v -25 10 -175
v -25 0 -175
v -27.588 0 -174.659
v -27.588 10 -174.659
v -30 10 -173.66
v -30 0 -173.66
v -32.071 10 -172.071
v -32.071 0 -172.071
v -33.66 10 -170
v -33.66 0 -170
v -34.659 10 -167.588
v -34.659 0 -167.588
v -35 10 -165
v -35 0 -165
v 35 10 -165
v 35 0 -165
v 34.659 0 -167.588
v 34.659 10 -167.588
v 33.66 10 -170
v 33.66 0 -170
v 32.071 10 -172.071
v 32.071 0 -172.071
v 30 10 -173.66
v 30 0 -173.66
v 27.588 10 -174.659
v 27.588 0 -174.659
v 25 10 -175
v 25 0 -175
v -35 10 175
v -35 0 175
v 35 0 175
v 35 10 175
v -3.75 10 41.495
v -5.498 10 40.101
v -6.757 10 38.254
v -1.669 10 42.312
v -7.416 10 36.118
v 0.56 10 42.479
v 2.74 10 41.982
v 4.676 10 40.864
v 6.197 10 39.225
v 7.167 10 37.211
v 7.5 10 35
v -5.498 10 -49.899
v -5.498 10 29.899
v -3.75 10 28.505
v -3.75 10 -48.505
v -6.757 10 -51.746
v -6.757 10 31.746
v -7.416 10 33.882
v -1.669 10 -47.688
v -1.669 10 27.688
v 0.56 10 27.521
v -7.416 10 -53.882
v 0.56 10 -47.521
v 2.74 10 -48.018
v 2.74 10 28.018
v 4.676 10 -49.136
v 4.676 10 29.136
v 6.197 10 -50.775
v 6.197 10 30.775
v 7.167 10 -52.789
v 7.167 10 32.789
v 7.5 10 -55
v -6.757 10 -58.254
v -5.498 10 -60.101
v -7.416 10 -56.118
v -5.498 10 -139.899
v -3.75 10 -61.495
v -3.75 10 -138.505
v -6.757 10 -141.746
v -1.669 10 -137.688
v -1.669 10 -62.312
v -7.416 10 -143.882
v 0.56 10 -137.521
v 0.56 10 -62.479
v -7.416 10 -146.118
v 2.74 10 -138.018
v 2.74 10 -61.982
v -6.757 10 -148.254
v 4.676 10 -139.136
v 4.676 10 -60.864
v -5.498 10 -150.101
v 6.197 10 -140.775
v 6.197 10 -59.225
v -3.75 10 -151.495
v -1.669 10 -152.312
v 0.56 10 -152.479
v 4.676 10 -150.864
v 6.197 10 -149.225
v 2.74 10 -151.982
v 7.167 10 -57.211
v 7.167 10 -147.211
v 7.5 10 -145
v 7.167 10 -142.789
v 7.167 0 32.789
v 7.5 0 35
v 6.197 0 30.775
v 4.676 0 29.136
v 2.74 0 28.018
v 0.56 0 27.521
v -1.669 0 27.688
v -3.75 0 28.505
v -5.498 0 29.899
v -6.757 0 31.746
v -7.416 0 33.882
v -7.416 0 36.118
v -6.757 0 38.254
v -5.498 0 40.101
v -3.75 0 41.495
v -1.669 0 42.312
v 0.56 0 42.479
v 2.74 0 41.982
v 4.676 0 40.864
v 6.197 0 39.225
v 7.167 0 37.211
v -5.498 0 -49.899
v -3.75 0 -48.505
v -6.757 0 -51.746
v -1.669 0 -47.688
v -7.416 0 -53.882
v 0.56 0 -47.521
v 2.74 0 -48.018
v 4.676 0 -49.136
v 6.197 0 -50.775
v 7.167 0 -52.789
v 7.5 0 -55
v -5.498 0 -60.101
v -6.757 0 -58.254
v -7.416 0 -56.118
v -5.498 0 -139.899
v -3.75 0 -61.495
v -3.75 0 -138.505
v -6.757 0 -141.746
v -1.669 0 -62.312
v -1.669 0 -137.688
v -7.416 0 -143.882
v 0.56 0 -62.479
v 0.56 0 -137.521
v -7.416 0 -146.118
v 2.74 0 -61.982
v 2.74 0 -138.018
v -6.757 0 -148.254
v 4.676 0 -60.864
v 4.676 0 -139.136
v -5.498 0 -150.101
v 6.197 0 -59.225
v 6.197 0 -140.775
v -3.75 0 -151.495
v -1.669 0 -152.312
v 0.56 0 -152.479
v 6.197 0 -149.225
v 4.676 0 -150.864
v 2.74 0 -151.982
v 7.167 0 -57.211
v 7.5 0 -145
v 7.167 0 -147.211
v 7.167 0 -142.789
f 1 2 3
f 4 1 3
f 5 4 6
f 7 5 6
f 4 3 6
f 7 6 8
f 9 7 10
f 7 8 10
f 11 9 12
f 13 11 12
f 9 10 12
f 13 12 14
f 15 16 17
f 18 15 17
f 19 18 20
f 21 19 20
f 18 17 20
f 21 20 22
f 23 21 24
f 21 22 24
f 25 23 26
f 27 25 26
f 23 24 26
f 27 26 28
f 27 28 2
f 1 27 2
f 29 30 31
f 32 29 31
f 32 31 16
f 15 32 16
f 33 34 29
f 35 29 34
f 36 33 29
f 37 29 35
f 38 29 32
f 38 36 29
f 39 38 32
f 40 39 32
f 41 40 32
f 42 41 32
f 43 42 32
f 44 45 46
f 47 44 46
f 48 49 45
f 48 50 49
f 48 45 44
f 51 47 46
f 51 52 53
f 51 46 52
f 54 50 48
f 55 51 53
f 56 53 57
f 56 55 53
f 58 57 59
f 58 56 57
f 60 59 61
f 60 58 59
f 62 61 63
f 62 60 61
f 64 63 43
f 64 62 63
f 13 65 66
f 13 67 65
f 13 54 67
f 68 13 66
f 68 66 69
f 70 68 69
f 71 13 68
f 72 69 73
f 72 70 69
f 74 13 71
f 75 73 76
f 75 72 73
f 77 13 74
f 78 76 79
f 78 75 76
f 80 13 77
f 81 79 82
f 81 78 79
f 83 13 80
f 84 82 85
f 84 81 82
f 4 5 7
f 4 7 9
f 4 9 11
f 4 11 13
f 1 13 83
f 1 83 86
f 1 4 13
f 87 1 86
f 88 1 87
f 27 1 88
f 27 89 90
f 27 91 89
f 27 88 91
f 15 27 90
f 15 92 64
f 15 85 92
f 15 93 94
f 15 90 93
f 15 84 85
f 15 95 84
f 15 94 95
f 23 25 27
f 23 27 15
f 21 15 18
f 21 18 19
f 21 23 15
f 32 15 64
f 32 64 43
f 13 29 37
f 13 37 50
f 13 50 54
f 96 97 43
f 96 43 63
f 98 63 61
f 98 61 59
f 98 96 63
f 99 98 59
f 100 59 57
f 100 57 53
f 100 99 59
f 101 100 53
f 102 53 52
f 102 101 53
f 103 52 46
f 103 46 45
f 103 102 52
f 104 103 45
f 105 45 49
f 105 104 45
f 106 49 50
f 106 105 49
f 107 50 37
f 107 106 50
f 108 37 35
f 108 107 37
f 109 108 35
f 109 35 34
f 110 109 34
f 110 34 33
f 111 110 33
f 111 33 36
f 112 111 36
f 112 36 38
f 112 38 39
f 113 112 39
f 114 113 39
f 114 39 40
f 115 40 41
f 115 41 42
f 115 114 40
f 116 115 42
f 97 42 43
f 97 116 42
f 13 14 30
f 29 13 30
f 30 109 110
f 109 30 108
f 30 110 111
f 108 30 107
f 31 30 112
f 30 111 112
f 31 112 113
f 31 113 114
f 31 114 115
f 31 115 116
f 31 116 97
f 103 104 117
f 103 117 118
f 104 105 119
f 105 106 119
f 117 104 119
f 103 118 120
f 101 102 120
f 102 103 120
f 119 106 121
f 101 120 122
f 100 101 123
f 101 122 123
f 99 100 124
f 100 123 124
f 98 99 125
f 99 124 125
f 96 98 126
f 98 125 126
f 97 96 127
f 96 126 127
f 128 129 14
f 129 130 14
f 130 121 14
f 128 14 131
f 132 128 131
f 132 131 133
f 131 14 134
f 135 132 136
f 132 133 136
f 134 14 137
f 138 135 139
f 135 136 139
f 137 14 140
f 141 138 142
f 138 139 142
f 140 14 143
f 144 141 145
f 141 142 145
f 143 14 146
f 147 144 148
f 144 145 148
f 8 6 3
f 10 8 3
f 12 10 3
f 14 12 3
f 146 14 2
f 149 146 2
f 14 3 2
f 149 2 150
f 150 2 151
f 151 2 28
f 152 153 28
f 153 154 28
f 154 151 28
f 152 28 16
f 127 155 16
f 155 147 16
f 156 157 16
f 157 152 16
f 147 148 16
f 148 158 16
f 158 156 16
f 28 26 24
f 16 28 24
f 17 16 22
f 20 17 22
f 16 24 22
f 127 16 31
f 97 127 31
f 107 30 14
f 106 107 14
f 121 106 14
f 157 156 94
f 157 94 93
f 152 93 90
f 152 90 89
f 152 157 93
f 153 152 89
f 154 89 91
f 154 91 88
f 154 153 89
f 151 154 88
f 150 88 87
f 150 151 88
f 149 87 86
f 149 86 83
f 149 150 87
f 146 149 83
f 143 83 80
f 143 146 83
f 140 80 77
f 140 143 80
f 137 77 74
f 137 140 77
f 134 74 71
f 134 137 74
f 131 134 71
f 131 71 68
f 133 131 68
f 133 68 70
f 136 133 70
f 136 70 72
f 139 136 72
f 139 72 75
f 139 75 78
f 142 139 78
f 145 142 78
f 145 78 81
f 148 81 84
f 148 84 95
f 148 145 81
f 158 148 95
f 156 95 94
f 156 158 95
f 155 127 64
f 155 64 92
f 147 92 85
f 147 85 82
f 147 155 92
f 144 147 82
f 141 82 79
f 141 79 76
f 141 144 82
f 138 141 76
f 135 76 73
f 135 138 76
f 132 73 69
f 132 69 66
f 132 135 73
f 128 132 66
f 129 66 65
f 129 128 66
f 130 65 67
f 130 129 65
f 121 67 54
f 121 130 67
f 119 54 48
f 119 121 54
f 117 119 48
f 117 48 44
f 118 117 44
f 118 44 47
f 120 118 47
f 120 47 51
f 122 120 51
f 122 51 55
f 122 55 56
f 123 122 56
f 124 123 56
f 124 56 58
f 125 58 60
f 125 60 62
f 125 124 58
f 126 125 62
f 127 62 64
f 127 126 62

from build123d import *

# Parameters (mm, degrees)
CROQUIS3_R              = 7.5
SALIENTE_EXTRUIR4_DEPTH = 10


with BuildPart() as part:
    # Croquis3 → Saliente-Extruir4 (new body)
    with BuildSketch(Plane(origin=(0, 0, 0), x_dir=(1, 0, 0), z_dir=(0, 1, 0))):
        with BuildLine():
            Line((-35, -175), (35, -175))
            Line((35, -175), (35, 165))
            ThreePointArc((35, 165), (32.071067812, 172.071067812), (25, 175))
            Line((25, 175), (-25, 175))
            ThreePointArc((-25, 175), (-32.071067812, 172.071067812), (-35, 165))
            Line((-35, 165), (-35, -175))
        make_face()
        with Locations((0, 145)):
            Circle(CROQUIS3_R, mode=Mode.SUBTRACT)
        with Locations((0, 55)):
            Circle(CROQUIS3_R, mode=Mode.SUBTRACT)
        with Locations((0, -35)):
            Circle(CROQUIS3_R, mode=Mode.SUBTRACT)
    extrude(amount=SALIENTE_EXTRUIR4_DEPTH)


solid = part.part
